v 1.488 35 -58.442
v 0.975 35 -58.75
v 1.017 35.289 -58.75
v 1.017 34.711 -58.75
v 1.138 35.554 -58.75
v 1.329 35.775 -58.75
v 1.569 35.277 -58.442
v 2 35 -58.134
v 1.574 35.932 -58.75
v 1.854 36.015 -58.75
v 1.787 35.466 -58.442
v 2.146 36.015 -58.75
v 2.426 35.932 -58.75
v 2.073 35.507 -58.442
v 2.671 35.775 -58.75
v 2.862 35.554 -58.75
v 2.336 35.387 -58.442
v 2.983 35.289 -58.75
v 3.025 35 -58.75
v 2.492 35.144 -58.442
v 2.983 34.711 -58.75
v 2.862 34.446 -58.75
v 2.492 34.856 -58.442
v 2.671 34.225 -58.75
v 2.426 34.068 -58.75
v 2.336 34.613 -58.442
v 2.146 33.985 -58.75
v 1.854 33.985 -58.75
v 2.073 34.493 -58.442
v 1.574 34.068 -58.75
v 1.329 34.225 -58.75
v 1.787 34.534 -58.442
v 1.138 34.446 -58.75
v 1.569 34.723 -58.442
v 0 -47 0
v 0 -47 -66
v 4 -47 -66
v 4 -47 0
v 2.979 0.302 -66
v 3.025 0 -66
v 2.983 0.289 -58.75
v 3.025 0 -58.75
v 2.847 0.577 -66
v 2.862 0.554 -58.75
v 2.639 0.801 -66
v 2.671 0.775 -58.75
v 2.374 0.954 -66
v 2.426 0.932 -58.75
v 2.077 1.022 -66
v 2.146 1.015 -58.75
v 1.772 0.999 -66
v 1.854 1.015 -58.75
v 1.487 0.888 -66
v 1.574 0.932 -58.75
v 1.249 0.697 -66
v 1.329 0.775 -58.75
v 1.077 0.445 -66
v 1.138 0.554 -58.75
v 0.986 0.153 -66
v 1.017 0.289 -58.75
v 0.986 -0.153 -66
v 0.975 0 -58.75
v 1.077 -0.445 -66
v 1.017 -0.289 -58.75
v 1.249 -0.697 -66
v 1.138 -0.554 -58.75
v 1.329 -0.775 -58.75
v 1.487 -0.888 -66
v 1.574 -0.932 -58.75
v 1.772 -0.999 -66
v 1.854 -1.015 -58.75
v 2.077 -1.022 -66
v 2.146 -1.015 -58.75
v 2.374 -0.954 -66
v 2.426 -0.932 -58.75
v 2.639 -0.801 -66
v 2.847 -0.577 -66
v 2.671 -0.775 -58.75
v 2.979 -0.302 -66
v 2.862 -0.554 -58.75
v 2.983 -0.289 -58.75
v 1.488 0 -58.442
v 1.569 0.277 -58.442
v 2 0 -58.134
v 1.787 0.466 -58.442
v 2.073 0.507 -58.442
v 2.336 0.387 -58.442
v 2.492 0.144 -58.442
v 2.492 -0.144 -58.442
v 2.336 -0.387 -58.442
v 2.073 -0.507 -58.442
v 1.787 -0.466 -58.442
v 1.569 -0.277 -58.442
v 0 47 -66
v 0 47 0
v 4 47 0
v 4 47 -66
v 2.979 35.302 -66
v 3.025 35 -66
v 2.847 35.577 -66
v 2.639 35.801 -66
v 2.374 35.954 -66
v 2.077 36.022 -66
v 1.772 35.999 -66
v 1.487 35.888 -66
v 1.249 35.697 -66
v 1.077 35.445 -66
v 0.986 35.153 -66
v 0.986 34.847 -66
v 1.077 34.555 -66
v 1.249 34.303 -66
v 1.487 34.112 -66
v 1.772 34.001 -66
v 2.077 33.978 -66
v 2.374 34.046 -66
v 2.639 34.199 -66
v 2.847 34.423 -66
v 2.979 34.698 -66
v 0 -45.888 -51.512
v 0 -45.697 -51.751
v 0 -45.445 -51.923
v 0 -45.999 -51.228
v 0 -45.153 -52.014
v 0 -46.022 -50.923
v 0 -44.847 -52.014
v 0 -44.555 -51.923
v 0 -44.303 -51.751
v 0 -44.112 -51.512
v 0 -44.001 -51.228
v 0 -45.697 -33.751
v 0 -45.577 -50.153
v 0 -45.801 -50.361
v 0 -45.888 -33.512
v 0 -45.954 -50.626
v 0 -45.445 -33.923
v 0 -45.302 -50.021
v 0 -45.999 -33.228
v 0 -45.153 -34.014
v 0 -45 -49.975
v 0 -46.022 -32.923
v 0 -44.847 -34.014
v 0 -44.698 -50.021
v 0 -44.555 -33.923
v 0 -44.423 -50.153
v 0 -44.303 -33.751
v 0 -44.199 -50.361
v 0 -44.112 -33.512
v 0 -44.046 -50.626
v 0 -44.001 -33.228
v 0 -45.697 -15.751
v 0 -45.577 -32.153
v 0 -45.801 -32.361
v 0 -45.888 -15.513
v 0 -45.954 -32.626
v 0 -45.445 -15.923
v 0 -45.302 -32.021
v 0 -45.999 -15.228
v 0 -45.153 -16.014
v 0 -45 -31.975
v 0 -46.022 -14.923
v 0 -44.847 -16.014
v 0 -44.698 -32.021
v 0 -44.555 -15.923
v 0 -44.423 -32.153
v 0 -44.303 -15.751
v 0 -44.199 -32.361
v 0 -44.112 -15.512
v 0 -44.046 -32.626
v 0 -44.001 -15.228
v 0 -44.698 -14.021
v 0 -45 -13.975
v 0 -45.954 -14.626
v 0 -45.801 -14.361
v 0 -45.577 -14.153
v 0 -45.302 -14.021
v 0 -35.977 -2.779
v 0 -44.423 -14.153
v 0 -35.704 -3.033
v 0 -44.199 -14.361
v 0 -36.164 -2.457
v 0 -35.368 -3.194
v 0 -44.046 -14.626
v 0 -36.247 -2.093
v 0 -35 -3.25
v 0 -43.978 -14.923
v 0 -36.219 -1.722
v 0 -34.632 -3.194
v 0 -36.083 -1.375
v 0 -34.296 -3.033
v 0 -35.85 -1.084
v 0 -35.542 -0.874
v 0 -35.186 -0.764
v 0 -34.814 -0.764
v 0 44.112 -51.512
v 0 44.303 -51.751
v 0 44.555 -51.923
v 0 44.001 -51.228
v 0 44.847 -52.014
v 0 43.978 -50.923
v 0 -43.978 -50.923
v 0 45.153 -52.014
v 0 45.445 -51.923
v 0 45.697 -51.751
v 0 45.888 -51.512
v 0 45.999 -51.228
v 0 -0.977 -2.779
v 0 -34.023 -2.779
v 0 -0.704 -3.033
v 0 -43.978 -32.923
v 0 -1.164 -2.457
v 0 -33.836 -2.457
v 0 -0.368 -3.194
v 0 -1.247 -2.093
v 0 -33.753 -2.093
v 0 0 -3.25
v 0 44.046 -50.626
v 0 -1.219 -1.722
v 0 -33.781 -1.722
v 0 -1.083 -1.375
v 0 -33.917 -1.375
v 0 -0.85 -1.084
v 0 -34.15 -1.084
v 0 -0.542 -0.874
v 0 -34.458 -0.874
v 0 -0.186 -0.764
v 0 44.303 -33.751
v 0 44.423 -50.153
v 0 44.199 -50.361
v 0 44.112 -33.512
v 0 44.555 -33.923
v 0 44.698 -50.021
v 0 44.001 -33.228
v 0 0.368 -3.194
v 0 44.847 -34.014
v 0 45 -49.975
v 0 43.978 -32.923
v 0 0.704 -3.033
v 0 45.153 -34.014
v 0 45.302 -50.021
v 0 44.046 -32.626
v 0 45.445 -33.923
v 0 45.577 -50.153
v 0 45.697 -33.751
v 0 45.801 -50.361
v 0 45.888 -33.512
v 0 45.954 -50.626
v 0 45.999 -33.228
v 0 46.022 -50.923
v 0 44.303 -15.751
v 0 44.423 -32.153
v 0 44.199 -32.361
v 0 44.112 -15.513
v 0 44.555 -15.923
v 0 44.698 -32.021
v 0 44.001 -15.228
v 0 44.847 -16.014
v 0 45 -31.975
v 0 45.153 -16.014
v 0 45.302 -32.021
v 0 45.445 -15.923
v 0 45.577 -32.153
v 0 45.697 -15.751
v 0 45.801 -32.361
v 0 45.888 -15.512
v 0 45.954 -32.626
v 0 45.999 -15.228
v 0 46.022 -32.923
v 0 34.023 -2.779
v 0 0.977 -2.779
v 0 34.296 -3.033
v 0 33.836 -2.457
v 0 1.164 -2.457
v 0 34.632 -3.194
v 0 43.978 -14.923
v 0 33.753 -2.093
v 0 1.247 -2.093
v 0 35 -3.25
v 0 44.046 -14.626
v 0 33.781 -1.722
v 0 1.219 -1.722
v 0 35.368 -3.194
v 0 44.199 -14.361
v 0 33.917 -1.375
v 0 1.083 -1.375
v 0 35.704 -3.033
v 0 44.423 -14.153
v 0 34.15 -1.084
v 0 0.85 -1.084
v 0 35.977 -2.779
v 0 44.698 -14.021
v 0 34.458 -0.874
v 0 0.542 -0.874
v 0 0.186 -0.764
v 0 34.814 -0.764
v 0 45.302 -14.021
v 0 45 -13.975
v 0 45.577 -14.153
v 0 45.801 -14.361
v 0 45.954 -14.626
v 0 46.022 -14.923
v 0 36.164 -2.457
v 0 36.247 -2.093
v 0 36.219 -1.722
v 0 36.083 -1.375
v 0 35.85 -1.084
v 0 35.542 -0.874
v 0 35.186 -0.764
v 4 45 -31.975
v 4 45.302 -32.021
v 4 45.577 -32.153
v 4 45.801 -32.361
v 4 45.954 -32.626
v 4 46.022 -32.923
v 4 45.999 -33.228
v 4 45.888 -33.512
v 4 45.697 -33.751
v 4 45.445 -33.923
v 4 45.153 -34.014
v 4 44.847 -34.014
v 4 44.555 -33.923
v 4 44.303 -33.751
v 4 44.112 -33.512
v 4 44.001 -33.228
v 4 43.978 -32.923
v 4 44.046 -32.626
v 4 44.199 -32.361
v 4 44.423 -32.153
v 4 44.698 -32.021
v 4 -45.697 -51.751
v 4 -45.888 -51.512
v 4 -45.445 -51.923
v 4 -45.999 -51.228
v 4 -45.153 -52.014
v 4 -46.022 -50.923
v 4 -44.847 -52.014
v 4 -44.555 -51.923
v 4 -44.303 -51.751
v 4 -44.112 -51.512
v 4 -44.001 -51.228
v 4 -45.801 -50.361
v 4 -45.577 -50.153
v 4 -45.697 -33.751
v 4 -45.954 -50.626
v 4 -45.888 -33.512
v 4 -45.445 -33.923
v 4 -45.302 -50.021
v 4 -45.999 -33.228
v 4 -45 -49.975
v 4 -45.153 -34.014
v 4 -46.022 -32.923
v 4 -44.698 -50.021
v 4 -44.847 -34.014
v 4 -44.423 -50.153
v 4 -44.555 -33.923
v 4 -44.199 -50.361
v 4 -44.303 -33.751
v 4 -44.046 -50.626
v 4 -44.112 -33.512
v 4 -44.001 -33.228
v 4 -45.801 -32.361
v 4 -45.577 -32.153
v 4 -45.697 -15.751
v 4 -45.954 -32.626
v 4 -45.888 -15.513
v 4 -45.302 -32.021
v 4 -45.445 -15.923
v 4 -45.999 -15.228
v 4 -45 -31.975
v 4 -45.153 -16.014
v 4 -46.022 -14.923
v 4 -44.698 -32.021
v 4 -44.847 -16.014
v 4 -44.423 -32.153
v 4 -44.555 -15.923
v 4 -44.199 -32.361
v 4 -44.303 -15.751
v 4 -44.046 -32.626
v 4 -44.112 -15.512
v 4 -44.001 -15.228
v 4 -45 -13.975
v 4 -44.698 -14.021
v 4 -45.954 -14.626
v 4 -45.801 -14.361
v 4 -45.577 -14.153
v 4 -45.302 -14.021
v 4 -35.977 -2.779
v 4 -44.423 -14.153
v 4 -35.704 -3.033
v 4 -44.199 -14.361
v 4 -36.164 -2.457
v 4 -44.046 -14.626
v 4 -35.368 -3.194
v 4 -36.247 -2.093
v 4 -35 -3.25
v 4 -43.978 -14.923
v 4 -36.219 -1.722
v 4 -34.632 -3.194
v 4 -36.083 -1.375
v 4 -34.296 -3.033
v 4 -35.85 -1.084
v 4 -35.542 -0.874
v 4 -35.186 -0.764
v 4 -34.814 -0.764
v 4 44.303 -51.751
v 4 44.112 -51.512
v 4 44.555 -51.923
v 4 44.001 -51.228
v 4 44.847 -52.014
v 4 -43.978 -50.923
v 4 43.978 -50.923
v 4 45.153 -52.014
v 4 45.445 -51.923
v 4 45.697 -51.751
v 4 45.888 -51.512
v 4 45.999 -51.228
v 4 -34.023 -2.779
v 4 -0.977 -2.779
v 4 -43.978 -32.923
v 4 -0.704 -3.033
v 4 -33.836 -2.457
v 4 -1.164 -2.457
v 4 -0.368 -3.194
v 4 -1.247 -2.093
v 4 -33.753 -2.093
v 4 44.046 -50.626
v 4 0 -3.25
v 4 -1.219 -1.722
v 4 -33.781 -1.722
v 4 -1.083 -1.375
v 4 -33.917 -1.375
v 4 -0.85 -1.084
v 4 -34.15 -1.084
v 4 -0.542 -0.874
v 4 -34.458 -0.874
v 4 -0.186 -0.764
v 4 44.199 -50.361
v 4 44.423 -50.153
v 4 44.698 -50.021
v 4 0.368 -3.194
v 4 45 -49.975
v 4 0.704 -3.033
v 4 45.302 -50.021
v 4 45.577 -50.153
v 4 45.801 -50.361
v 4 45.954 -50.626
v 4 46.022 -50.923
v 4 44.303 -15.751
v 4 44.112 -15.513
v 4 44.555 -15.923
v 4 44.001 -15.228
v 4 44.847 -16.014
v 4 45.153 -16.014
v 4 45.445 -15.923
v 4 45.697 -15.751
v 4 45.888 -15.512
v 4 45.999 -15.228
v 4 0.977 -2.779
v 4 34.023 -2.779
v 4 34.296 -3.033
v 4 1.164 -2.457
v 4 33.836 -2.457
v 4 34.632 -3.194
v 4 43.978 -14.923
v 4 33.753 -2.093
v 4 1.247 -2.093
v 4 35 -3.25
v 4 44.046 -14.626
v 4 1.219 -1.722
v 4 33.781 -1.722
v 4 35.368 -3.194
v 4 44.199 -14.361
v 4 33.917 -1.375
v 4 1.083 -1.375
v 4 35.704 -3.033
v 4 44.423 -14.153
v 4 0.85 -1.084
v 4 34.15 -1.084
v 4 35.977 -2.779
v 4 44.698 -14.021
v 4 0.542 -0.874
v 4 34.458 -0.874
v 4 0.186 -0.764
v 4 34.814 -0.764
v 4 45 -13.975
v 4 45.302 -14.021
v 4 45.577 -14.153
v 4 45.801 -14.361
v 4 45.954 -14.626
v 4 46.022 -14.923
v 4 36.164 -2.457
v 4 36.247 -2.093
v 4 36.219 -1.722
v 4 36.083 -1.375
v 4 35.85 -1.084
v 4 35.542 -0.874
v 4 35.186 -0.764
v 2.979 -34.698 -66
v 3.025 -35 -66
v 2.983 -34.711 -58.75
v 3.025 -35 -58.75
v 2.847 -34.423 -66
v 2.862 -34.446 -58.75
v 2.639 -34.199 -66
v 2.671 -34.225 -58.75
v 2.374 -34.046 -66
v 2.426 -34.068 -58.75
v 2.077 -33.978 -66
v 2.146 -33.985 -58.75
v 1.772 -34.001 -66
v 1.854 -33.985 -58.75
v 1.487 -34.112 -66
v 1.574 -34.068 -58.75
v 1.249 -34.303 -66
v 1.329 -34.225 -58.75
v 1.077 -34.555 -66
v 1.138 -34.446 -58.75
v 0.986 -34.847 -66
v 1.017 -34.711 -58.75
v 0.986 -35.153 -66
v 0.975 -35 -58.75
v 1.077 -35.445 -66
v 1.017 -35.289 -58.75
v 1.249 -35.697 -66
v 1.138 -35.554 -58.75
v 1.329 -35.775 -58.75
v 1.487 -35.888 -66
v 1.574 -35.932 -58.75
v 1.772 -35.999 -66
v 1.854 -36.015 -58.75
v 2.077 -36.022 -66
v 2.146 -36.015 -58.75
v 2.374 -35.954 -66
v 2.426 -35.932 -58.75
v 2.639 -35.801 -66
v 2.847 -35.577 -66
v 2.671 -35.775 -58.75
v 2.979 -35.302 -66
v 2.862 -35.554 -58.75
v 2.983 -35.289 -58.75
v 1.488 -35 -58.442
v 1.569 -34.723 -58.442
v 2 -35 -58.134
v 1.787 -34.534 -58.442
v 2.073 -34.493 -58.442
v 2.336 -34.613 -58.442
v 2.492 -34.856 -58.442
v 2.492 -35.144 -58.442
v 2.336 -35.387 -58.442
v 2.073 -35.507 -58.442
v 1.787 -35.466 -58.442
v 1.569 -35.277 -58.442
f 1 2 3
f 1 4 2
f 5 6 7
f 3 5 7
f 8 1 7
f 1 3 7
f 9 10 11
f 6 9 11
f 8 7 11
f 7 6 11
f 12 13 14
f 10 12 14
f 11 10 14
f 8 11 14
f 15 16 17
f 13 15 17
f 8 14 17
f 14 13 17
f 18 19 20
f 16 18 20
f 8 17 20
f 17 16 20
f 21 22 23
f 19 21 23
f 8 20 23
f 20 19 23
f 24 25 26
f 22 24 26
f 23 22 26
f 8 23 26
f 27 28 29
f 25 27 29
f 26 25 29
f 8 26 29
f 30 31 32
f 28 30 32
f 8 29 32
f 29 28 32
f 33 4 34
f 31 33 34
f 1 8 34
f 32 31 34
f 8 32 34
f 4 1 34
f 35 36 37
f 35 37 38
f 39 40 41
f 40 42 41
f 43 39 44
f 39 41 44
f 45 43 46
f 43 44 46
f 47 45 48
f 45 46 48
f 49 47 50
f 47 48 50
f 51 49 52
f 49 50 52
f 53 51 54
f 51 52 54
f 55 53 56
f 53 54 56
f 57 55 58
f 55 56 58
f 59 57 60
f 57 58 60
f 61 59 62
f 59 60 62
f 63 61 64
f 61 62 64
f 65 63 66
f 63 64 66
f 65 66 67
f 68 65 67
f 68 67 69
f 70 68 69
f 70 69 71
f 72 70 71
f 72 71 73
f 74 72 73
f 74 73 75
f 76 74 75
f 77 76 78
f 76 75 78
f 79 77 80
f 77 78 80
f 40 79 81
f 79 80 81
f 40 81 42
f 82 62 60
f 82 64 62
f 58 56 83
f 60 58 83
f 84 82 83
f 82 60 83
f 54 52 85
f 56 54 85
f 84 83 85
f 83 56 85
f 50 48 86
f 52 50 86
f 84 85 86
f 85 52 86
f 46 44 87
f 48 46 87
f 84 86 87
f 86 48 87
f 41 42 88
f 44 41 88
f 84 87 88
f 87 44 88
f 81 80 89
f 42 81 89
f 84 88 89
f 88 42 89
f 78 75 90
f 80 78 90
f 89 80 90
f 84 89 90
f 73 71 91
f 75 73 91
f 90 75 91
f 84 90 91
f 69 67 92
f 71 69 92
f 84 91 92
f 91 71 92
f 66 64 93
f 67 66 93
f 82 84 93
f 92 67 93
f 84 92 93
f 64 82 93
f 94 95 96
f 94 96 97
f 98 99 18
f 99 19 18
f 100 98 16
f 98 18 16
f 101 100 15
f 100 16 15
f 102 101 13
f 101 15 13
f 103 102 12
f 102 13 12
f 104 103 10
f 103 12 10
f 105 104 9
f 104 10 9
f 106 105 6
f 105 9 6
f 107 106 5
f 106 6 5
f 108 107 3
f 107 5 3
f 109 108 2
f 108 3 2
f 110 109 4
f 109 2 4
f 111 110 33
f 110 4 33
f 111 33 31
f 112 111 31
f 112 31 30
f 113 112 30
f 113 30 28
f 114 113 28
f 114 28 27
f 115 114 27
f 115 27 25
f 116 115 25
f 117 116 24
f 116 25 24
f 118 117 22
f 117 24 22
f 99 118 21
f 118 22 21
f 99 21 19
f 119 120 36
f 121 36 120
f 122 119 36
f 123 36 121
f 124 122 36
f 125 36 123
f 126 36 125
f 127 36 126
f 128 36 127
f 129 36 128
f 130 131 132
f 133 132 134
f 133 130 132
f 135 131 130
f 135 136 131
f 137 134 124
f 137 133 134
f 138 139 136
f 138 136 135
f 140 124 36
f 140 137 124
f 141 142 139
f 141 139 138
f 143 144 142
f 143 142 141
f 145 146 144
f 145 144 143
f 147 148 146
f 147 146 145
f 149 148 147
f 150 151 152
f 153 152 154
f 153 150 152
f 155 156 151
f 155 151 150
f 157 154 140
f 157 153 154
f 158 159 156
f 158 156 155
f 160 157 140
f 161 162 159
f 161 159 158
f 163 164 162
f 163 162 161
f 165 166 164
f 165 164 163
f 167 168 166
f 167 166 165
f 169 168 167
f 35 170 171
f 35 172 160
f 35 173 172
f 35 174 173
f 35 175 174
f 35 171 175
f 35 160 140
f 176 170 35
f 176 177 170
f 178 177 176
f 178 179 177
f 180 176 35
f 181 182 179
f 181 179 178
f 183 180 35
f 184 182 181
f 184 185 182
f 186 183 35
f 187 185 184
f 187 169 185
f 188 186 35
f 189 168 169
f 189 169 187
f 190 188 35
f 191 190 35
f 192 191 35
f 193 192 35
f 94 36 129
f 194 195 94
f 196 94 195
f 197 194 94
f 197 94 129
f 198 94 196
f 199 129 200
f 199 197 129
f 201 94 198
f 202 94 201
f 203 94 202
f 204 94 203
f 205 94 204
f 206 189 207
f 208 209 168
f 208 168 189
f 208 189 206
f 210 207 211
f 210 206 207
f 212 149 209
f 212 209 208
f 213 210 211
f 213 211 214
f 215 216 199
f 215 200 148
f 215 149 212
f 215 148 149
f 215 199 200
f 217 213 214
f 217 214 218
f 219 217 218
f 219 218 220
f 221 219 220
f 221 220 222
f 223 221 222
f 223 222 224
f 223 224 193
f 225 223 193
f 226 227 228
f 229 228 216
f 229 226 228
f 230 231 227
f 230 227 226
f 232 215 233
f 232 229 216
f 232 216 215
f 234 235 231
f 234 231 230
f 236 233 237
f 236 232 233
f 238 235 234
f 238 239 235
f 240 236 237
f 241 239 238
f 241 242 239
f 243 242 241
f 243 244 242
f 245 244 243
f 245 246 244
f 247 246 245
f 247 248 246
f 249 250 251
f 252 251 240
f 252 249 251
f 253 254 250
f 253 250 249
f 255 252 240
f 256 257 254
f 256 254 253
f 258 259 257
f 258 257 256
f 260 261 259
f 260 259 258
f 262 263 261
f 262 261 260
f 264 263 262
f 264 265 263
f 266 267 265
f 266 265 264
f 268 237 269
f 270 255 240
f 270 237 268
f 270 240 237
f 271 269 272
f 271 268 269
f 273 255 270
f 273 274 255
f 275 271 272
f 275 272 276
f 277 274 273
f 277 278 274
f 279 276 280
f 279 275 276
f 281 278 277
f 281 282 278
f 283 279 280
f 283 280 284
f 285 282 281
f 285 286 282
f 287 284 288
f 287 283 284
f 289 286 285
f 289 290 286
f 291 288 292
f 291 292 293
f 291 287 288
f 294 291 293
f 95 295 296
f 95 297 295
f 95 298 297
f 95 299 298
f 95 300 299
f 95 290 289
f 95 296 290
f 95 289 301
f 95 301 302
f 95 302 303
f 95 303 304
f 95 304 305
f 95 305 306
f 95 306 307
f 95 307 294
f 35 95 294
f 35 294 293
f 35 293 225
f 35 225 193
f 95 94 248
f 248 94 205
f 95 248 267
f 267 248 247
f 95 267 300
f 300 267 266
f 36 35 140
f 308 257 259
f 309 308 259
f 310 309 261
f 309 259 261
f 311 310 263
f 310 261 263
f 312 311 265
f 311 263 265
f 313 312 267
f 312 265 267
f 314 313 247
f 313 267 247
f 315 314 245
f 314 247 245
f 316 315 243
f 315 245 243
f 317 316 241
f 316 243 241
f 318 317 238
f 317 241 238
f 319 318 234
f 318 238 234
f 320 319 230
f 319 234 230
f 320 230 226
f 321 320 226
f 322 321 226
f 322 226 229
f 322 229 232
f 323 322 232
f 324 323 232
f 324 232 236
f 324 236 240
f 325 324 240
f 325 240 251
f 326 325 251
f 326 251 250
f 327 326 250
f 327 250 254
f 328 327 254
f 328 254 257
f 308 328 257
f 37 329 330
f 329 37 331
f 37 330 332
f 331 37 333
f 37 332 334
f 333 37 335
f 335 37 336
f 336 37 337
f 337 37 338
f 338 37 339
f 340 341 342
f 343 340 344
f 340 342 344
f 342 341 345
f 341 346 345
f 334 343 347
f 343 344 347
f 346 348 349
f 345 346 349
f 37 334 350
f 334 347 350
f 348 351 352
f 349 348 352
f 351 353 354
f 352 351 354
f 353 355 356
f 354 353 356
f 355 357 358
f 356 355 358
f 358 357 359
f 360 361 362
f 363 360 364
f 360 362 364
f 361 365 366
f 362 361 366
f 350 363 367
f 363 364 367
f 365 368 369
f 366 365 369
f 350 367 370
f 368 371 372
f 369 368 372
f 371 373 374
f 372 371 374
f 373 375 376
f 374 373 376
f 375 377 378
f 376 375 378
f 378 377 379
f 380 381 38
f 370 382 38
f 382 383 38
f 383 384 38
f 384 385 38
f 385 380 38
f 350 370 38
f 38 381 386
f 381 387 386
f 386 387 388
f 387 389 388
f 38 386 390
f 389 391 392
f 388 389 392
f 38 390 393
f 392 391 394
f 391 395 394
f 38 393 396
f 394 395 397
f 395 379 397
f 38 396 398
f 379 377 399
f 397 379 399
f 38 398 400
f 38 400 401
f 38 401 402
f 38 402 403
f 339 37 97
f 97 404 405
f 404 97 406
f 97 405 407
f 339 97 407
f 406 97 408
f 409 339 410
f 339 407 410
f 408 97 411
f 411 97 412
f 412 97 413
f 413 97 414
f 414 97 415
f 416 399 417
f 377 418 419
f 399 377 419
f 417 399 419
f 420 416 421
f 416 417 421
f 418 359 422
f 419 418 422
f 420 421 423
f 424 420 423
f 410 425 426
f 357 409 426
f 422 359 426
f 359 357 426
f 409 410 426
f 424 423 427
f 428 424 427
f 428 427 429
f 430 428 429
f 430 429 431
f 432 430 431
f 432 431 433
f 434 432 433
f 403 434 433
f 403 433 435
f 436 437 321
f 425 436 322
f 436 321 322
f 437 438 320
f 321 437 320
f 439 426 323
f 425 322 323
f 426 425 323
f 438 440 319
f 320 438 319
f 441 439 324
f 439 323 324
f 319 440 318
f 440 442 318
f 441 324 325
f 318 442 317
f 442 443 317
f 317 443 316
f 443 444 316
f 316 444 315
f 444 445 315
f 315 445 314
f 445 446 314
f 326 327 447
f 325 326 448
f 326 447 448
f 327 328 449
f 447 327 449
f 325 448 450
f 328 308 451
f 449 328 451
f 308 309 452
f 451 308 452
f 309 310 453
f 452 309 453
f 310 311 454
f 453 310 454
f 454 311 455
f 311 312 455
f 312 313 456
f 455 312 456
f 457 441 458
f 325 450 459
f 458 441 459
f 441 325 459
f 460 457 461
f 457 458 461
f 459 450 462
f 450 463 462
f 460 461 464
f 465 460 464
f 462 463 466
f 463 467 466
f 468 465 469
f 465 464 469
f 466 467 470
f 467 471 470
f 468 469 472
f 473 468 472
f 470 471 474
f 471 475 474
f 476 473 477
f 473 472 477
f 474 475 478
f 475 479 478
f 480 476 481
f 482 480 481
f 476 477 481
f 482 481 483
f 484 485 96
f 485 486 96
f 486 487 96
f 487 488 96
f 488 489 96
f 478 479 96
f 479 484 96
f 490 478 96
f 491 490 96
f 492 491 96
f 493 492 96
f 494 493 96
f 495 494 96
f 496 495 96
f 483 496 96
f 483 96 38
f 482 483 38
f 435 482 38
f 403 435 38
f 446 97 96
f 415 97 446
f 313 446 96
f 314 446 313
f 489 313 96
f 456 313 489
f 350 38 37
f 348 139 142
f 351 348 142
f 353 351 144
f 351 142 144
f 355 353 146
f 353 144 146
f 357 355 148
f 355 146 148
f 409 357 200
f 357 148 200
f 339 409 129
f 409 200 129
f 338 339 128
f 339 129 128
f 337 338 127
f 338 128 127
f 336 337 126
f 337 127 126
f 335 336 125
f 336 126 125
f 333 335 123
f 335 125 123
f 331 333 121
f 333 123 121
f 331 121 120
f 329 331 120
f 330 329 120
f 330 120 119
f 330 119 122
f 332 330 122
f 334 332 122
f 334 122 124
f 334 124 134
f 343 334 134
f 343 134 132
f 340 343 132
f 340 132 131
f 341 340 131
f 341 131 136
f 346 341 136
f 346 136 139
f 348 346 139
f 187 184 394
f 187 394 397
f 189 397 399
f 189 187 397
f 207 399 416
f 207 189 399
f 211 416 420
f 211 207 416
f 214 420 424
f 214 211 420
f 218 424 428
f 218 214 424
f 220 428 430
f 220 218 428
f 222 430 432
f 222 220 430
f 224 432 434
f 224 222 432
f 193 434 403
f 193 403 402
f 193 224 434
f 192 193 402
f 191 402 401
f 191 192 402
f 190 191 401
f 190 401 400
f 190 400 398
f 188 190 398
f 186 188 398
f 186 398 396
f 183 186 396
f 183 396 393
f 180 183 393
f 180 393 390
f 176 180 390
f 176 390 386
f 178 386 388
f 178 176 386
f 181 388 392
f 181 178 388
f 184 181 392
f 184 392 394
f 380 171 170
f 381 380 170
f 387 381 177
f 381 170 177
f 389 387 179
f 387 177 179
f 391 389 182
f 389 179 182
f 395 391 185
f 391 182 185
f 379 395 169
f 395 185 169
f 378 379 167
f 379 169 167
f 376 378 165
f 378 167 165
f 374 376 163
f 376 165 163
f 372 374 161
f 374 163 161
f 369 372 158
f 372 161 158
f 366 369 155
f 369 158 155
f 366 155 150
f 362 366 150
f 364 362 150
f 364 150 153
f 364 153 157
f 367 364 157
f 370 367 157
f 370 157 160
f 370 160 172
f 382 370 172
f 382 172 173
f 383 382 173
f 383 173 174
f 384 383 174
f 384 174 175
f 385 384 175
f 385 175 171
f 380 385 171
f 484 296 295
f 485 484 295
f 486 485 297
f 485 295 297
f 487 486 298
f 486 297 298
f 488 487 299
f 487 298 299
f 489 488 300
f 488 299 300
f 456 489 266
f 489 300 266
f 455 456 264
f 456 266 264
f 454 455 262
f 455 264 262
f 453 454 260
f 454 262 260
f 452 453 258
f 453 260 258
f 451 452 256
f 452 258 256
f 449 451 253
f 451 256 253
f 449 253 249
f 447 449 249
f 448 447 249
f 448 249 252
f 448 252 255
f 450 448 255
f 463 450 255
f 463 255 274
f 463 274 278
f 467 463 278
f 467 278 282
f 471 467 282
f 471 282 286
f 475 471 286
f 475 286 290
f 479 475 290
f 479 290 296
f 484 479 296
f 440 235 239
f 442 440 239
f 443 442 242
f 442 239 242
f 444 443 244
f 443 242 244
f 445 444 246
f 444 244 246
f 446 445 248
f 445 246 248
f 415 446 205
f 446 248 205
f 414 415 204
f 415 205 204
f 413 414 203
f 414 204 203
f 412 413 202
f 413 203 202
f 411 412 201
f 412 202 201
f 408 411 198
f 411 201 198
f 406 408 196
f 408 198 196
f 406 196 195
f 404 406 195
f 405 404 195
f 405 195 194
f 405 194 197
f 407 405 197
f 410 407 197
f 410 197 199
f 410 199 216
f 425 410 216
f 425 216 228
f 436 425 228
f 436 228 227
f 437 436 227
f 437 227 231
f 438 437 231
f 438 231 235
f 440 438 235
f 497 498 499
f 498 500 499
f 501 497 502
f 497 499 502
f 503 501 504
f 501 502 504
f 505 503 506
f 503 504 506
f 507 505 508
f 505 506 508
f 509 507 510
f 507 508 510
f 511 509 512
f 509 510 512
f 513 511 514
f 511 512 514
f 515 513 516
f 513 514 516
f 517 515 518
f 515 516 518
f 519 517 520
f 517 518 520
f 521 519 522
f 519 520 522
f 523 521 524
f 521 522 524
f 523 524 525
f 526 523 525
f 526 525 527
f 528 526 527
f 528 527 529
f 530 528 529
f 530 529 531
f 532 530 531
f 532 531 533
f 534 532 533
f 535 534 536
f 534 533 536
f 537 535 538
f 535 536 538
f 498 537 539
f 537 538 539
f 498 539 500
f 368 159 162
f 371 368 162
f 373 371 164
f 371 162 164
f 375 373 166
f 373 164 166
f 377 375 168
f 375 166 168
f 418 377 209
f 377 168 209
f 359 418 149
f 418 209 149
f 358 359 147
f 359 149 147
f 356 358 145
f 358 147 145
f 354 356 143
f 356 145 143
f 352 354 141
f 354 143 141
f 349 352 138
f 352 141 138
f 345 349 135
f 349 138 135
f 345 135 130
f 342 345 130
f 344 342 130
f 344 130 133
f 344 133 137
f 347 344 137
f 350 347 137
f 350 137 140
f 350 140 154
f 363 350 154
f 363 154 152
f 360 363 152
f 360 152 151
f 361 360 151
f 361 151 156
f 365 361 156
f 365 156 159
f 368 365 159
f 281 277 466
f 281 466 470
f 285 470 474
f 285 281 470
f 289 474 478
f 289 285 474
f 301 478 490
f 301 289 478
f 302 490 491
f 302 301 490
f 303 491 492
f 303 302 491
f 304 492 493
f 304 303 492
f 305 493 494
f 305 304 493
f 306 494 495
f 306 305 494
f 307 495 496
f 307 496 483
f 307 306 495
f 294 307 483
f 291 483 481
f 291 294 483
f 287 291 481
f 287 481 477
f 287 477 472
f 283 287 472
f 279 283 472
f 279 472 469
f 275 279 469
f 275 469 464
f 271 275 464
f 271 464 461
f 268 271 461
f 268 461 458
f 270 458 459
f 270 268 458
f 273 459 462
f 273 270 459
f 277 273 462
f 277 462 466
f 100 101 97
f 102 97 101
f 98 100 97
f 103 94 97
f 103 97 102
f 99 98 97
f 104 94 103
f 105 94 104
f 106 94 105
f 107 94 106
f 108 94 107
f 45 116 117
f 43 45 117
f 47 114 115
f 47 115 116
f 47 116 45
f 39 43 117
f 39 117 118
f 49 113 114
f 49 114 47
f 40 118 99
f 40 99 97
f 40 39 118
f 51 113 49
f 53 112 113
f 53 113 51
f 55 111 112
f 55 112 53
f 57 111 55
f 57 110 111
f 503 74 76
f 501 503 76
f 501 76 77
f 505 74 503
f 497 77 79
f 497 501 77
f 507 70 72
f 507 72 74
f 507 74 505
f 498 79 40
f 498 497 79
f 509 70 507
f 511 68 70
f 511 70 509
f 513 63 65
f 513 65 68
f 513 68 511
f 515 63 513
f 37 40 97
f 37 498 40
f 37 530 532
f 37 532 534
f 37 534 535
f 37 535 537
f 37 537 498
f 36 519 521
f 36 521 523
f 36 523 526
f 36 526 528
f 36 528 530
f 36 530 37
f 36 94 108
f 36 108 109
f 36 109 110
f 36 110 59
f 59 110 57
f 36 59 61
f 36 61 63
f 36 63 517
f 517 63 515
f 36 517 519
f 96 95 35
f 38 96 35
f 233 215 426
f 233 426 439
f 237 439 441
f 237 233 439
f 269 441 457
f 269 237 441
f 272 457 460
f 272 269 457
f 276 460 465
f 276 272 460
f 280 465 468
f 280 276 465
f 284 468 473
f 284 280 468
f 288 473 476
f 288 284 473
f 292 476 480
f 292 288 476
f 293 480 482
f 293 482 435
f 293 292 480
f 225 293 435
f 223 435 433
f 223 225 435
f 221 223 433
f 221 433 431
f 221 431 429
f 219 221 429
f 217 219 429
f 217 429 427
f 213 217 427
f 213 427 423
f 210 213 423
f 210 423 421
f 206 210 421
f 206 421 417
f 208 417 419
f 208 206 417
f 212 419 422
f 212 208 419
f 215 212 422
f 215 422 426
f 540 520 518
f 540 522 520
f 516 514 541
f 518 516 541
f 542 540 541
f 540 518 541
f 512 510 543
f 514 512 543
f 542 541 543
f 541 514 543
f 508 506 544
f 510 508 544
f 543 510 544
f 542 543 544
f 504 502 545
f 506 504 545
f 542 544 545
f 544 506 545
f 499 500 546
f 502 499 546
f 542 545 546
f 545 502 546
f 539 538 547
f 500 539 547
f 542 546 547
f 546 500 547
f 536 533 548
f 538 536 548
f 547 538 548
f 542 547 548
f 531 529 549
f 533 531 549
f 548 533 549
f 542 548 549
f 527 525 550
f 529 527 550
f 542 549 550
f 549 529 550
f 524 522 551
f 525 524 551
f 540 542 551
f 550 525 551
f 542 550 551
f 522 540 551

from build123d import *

# Parameters (mm, degrees)
SKETCH_1_R               = 1.25
EXTRUDE_1_DEPTH          = 4
HOLE_WIZARD_M2_5_1_D     = 2.05
HOLE_WIZARD_M2_5_2_D     = 2.05
HOLE_WIZARD_M2_5_2_DEPTH = 7.25
HOLE_WIZARD_M2_5_2_TIP   = 0.615882135


with BuildPart() as part:
    # 草图1 → 凸台-拉伸1 (new body)
    with BuildSketch(Plane(origin=(0, 0, 0), x_dir=(0, 0, -1), z_dir=(1, 0, 0))):
        Polygon((0, 0), (0, 47), (66, 47), (66, -47), (0, -47), align=None)
        with Locations((2, 0)):
            Circle(SKETCH_1_R, mode=Mode.SUBTRACT)
        with Locations((2, 35)):
            Circle(SKETCH_1_R, mode=Mode.SUBTRACT)
        with Locations((2, -35)):
            Circle(SKETCH_1_R, mode=Mode.SUBTRACT)
    extrude(amount=EXTRUDE_1_DEPTH)

    # M2.5 螺纹孔1 (through all)
    with Locations(Plane(origin=(4, 0, 0), x_dir=(0, 0, -1), z_dir=(1, 0, 0))):
        with Locations((15, 45), (51, 45), (15, -45), (51, -45), (33, -45), (33, 45)):
            Hole(HOLE_WIZARD_M2_5_1_D / 2)

    # M2.5 螺纹孔2
    with Locations(Plane(origin=(0, 0, -66), x_dir=(-1, 0, 0), z_dir=(0, 0, -1))):
        with Locations((-2, 35), (-2, 0), (-2, -35)):
            Hole(HOLE_WIZARD_M2_5_2_D / 2, depth=HOLE_WIZARD_M2_5_2_DEPTH)
            with Locations((0, 0, -(HOLE_WIZARD_M2_5_2_DEPTH + HOLE_WIZARD_M2_5_2_TIP / 2))):  # 118° drill point
                Cone(0, HOLE_WIZARD_M2_5_2_D / 2, HOLE_WIZARD_M2_5_2_TIP, mode=Mode.SUBTRACT)


solid = part.part
